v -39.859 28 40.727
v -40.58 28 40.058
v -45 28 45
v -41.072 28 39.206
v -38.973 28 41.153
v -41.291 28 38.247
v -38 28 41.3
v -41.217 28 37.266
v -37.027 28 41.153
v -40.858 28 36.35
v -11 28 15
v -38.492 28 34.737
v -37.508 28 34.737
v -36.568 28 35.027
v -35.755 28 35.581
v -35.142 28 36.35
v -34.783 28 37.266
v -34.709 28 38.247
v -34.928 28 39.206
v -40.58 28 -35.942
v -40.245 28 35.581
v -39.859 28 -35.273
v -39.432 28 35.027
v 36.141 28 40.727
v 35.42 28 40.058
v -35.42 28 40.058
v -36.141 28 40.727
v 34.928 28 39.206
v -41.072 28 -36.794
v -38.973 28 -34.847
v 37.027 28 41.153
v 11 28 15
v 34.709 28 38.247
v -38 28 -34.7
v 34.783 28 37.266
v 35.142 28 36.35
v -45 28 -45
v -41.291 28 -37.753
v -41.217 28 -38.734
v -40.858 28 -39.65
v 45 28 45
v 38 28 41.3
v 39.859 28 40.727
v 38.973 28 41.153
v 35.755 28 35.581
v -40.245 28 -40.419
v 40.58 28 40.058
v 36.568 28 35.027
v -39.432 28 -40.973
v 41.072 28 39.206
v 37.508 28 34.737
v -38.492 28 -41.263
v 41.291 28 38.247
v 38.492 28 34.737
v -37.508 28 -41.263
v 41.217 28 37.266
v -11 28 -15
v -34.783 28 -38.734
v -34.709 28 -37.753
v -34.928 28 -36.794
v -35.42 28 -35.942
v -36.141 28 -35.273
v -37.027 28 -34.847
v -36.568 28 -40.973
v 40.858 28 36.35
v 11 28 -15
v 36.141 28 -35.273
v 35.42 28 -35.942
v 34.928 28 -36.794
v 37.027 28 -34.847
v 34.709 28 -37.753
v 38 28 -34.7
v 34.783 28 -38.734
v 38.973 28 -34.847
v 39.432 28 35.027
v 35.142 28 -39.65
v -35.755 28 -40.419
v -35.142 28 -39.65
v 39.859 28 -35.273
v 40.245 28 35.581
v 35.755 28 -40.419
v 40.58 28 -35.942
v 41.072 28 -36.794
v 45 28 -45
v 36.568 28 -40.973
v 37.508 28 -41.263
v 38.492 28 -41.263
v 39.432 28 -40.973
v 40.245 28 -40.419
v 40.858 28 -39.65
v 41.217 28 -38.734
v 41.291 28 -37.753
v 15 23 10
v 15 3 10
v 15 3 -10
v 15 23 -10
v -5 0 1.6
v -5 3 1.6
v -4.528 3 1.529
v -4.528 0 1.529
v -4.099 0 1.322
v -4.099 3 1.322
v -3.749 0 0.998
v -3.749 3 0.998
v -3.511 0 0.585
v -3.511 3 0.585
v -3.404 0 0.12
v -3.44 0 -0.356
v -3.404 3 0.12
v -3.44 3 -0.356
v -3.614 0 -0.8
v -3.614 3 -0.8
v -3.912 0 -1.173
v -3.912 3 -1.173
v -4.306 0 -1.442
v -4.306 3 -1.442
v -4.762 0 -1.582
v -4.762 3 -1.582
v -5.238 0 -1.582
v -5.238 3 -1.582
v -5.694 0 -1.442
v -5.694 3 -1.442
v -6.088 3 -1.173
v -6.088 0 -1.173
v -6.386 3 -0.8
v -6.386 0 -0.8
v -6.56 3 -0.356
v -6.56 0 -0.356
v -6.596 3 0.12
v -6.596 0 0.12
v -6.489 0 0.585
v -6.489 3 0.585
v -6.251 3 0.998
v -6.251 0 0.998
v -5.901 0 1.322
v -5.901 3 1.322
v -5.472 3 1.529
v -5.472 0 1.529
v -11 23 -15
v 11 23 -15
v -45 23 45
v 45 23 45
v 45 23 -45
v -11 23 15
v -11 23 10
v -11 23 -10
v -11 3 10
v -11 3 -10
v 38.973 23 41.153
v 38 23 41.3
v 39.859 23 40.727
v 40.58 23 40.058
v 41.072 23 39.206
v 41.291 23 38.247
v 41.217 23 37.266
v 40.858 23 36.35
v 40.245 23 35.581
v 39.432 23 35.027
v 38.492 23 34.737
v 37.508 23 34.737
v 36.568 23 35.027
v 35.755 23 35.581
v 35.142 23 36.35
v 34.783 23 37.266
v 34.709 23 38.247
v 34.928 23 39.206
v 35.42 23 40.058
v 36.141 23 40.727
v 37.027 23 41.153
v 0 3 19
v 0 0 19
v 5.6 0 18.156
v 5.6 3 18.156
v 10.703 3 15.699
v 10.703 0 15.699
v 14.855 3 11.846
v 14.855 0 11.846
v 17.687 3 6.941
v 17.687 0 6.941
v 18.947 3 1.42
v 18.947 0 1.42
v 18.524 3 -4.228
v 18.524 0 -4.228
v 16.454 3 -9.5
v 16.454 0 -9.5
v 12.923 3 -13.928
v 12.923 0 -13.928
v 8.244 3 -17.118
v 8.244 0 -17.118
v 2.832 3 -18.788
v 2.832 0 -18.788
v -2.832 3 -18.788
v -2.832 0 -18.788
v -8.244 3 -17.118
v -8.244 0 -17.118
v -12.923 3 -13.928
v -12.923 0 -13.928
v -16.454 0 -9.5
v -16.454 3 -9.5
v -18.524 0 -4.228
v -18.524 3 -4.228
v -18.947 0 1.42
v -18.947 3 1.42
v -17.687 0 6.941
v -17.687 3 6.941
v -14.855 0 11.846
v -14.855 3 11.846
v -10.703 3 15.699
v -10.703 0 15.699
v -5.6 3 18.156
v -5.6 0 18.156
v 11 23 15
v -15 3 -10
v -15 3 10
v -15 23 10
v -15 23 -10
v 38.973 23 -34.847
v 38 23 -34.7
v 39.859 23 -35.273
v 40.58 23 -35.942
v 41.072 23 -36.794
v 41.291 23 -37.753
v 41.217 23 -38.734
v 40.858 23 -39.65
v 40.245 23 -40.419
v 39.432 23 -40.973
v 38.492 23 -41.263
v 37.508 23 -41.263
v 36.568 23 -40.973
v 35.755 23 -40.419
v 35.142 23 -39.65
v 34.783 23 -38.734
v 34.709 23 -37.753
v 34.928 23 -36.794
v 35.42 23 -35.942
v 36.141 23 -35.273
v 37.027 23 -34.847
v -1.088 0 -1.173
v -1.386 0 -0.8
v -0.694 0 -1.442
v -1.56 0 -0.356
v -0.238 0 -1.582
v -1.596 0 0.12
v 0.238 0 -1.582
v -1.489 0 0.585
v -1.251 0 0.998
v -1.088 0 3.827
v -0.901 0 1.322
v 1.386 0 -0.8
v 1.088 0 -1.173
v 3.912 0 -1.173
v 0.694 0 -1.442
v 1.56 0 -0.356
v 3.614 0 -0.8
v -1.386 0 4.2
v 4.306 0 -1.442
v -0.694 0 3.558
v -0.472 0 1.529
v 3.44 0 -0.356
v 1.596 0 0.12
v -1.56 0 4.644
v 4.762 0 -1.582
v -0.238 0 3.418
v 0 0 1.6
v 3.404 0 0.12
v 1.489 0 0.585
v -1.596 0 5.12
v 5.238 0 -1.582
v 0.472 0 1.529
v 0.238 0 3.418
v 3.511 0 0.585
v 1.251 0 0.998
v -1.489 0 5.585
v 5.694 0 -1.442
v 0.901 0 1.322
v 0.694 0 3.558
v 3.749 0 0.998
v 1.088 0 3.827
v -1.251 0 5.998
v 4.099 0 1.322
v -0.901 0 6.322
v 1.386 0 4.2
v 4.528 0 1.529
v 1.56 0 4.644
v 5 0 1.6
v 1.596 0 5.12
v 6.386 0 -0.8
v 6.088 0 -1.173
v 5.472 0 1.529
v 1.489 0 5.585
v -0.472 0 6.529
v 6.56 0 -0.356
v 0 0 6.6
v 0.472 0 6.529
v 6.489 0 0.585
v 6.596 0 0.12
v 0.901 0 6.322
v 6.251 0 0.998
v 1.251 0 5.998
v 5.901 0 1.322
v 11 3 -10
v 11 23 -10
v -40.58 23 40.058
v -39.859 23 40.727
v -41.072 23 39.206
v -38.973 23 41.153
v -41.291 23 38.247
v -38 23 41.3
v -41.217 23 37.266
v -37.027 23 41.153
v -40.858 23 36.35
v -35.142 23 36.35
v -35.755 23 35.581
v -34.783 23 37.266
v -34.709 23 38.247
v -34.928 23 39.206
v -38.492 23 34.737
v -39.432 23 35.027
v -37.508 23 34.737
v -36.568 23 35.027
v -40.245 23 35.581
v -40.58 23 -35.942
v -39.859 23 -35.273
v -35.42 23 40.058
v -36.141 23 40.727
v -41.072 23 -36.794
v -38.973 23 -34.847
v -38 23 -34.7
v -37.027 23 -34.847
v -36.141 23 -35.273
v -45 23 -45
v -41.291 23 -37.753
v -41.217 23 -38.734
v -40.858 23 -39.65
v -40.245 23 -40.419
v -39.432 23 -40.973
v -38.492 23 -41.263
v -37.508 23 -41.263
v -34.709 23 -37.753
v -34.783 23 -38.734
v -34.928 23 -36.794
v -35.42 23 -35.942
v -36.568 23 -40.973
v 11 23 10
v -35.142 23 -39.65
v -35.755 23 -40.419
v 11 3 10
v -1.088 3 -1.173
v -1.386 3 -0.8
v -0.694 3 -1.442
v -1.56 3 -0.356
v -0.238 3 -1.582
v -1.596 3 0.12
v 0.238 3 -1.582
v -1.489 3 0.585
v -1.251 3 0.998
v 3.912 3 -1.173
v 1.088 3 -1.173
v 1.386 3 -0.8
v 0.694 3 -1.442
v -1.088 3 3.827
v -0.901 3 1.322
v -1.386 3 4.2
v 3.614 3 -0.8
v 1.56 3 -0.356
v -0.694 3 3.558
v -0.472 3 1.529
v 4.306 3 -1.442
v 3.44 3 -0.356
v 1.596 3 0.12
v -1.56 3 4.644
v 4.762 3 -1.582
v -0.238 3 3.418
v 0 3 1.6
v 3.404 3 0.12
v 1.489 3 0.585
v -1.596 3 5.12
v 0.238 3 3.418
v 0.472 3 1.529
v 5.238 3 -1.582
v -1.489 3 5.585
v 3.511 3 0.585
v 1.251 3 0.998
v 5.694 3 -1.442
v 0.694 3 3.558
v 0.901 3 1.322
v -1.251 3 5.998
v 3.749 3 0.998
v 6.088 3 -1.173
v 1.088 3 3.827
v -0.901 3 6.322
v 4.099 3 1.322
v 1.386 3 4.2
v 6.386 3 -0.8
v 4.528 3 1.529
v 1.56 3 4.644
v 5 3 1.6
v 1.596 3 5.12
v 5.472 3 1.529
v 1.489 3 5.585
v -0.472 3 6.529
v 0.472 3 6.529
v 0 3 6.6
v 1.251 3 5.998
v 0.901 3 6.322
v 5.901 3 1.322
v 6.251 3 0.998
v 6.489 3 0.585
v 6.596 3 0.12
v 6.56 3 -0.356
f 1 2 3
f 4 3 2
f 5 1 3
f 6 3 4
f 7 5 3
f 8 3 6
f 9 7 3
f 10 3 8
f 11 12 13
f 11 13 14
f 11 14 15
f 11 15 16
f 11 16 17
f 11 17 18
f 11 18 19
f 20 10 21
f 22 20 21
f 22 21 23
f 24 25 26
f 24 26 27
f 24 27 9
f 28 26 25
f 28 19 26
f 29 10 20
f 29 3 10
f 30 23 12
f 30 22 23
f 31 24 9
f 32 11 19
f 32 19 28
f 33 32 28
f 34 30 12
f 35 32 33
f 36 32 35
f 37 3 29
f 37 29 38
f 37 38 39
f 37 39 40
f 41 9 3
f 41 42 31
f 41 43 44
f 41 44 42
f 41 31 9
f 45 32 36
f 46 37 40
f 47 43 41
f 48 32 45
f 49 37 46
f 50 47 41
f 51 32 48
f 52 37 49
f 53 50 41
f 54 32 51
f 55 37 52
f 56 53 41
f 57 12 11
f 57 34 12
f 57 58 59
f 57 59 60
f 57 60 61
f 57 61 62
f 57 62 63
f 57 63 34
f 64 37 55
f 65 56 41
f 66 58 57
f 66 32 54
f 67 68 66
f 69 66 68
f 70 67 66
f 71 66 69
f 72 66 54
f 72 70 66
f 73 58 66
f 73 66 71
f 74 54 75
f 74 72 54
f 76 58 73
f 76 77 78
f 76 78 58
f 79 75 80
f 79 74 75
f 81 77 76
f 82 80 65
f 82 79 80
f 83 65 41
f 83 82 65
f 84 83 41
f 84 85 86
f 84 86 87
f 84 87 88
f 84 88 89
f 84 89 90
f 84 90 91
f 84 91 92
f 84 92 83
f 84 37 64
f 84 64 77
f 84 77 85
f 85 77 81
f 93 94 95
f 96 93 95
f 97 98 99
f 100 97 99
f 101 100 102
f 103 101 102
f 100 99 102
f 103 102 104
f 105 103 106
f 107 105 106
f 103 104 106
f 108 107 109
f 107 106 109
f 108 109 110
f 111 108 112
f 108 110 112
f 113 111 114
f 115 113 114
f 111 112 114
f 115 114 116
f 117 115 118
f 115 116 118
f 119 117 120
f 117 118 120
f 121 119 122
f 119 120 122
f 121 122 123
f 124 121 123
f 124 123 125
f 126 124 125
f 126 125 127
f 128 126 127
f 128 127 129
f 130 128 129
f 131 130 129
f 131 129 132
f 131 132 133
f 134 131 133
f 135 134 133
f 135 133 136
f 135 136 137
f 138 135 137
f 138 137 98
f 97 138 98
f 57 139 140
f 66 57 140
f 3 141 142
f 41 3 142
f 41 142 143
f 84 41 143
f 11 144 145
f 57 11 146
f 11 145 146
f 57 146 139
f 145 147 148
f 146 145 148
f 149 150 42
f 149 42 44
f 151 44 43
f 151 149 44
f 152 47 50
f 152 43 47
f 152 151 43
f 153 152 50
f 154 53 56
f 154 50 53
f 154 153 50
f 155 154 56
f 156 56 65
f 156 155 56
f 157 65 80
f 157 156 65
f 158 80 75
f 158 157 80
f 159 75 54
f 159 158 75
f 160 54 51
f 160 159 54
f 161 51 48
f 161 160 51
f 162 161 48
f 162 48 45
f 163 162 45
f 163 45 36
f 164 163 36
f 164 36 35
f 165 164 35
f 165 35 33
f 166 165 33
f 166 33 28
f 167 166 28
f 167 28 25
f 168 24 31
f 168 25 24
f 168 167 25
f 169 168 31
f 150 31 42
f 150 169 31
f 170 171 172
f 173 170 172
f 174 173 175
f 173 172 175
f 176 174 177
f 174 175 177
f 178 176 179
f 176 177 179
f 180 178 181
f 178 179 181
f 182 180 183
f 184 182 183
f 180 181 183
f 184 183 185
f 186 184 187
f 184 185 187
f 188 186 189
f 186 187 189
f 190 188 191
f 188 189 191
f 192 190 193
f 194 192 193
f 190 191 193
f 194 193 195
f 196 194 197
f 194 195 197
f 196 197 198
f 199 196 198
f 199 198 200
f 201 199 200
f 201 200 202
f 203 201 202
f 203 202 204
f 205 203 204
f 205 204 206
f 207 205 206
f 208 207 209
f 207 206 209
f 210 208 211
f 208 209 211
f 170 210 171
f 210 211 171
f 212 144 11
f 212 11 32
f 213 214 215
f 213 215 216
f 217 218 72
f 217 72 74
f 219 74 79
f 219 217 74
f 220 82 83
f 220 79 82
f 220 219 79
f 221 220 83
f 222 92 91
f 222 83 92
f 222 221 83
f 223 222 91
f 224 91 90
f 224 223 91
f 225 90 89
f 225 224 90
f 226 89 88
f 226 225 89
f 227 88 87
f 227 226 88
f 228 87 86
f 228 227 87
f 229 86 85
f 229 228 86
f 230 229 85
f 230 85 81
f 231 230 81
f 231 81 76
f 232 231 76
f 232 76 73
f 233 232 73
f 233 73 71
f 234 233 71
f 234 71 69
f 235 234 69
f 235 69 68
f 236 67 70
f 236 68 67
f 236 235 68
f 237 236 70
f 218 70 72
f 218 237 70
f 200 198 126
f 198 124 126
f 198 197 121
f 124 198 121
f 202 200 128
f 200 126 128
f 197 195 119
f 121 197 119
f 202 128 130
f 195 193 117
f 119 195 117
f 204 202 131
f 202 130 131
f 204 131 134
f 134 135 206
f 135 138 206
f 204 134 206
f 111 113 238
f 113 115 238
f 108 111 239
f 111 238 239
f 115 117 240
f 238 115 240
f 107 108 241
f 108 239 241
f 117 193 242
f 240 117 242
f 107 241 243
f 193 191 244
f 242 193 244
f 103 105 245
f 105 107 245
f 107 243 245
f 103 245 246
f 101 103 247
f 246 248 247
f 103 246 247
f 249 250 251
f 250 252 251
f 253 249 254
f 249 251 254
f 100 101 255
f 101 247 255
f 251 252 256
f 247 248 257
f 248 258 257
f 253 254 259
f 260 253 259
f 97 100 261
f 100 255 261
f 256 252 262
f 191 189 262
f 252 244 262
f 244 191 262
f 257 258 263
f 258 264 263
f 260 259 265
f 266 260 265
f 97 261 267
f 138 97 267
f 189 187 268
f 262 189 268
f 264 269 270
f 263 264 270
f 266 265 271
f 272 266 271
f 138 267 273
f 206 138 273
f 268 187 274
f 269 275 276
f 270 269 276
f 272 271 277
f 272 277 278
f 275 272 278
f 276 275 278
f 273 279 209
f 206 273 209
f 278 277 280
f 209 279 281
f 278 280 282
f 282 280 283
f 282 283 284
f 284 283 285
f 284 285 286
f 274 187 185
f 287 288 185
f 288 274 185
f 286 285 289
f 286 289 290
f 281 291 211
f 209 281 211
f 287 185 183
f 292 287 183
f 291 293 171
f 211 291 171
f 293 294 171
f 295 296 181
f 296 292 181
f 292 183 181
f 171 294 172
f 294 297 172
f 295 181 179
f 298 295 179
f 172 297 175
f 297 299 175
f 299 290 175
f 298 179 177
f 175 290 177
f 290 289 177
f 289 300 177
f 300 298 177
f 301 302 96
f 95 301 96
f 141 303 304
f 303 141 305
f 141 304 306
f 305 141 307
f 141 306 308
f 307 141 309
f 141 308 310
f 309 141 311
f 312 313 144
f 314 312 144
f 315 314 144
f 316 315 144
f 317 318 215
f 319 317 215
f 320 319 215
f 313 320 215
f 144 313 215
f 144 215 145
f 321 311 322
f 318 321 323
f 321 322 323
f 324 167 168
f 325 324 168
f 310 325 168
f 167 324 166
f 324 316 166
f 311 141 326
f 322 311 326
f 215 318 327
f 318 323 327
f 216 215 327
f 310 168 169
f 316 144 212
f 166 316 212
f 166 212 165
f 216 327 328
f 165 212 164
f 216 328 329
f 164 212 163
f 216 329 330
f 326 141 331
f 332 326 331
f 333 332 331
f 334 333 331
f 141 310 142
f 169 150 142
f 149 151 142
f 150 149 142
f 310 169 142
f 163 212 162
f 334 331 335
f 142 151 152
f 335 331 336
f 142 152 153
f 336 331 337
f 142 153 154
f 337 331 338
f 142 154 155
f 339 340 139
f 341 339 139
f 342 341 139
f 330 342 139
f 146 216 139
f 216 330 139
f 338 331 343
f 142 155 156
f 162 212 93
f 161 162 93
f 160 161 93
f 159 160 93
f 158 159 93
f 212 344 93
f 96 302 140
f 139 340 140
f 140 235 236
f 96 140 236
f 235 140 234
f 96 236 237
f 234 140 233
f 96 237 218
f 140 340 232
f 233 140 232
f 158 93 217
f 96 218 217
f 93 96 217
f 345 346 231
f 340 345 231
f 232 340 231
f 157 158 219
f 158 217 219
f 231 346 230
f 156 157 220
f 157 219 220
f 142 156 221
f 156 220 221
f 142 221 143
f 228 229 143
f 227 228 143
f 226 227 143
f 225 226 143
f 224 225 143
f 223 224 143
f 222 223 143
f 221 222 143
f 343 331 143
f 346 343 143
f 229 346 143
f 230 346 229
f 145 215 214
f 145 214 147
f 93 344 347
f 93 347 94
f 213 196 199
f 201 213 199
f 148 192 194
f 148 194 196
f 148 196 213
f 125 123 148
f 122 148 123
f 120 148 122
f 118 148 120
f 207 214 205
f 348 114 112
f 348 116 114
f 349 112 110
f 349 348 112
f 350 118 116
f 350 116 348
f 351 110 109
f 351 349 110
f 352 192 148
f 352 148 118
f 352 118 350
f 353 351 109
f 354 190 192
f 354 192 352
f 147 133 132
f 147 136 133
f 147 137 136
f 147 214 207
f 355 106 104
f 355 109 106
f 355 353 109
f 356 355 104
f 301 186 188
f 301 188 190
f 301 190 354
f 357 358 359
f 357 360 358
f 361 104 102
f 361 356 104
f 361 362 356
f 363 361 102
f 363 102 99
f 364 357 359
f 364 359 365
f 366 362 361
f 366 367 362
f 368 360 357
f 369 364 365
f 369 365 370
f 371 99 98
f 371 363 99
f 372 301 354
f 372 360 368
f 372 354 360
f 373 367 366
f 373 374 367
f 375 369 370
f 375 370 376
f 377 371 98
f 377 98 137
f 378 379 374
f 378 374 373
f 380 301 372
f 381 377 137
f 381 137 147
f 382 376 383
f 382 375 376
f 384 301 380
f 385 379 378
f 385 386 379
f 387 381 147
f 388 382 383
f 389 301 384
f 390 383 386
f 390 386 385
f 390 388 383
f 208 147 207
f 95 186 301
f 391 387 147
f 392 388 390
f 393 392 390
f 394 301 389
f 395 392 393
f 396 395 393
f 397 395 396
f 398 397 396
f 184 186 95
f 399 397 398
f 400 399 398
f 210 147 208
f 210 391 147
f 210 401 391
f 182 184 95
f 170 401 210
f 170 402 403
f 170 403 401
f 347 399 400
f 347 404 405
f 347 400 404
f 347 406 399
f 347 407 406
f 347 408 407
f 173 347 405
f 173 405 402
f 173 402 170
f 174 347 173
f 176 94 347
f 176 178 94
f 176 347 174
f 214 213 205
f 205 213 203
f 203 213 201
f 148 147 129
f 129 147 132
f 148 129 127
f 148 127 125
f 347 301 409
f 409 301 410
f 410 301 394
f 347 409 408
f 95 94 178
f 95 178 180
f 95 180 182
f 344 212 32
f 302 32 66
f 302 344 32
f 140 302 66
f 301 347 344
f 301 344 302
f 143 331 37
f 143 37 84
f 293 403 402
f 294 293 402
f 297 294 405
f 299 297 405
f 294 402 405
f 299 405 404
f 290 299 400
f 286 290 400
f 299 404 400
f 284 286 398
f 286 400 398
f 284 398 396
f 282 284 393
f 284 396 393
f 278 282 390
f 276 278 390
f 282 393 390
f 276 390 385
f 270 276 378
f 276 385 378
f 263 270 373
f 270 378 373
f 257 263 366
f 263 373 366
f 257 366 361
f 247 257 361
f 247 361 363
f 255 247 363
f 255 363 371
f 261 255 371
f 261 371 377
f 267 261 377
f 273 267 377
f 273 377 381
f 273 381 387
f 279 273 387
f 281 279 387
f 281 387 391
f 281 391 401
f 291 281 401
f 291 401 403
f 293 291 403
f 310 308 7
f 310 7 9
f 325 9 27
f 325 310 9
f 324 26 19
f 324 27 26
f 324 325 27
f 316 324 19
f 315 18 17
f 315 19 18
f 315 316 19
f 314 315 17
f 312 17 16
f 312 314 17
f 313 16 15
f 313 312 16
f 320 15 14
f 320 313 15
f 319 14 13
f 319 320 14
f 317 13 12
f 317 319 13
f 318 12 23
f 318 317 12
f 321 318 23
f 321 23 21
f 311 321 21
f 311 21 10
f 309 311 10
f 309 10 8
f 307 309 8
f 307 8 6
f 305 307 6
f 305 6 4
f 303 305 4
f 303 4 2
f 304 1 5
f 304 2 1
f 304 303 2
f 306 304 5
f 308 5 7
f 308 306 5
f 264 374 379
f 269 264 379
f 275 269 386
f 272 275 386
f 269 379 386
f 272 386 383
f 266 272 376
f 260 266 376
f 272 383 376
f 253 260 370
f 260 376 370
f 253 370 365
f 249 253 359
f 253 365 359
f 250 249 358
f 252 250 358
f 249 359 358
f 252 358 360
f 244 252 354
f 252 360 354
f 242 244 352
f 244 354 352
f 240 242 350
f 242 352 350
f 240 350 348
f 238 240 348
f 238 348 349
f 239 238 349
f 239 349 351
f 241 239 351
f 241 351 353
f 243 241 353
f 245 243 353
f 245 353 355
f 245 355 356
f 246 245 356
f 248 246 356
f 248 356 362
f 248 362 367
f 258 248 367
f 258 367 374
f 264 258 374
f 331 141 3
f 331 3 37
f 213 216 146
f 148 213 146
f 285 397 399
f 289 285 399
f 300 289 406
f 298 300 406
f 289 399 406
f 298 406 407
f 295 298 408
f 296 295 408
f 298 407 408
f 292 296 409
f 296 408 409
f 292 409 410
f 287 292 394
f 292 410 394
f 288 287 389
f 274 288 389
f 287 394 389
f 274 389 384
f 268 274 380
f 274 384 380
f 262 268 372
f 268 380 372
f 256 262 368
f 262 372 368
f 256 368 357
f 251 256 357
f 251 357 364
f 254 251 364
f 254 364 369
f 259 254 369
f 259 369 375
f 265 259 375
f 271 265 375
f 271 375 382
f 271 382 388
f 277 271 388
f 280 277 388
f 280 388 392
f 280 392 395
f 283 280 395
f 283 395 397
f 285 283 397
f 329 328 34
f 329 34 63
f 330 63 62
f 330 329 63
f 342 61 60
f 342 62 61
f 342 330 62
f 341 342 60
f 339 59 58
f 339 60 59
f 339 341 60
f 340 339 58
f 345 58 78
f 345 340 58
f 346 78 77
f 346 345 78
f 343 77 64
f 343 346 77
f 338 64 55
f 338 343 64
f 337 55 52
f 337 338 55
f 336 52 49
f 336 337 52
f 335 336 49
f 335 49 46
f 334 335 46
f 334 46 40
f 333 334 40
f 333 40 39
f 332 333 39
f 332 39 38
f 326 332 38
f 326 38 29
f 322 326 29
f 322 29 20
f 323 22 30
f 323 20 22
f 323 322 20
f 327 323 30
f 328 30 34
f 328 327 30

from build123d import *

# Parameters (mm, degrees)
SKETCH_1_R               = 19
EXTRUDE_1_DEPTH          = 3
CUT_EXTRUDE_1_REACH      = 29.037
SKETCH_2_R               = 1.6
SKETCH_3_W               = 4
SKETCH_3_H               = 20
EXTRUDE_2_DEPTH          = 20
SKETCH_4_W               = 90
SKETCH_4_H               = 90
EXTRUDE_3_DEPTH          = 5
CUT_EXTRUDE_2_DEPTH      = 70.526973183
CUT_EXTRUDE_2_DEPTH_BACK = 70.526973183
SKETCH_5_R               = 3.3
CUT_EXTRUDE_3_DEPTH      = 70.526973183
CUT_EXTRUDE_3_DEPTH_BACK = 5
SKETCH_6_W               = 22
SKETCH_6_H               = 30


with BuildPart() as part:
    # 草图1 → 凸台-拉伸1 (new body)
    with BuildSketch(Plane(origin=(0, 0, 0), x_dir=(1, 0, 0), z_dir=(0, 1, 0))):
        with Locations(Location((0, 0, 0), (0, 0, 270))):
            Circle(SKETCH_1_R)
    extrude(amount=EXTRUDE_1_DEPTH)

    # 草图2 → 切除-拉伸1 (cut, up to next)
    with BuildSketch(Plane(origin=(0, 3, 0), x_dir=(1, 0, 0), z_dir=(0, 1, 0)), mode=Mode.PRIVATE) as cut_extrude_1_sk1:
        with Locations(Location((-5, 0, 0), (0, 0, 270))):
            Circle(SKETCH_2_R)
    cut_extrude_1_tool1 = extrude(cut_extrude_1_sk1.sketch, amount=-CUT_EXTRUDE_1_REACH, mode=Mode.PRIVATE) & part.part
    # 草图2 → 切除-拉伸1 (cut, up to next)
    with BuildSketch(Plane(origin=(0, 3, 0), x_dir=(1, 0, 0), z_dir=(0, 1, 0)), mode=Mode.PRIVATE) as cut_extrude_1_sk2:
        with Locations(Location((0, 0, 0), (0, 0, 270))):
            Circle(SKETCH_2_R)
    cut_extrude_1_tool2 = extrude(cut_extrude_1_sk2.sketch, amount=-CUT_EXTRUDE_1_REACH, mode=Mode.PRIVATE) & part.part
    # 草图2 → 切除-拉伸1 (cut, up to next)
    with BuildSketch(Plane(origin=(0, 3, 0), x_dir=(1, 0, 0), z_dir=(0, 1, 0)), mode=Mode.PRIVATE) as cut_extrude_1_sk3:
        with Locations(Location((5, 0, 0), (0, 0, 270))):
            Circle(SKETCH_2_R)
    cut_extrude_1_tool3 = extrude(cut_extrude_1_sk3.sketch, amount=-CUT_EXTRUDE_1_REACH, mode=Mode.PRIVATE) & part.part
    # 草图2 → 切除-拉伸1 (cut, up to next)
    with BuildSketch(Plane(origin=(0, 3, 0), x_dir=(1, 0, 0), z_dir=(0, 1, 0)), mode=Mode.PRIVATE) as cut_extrude_1_sk4:
        with Locations(Location((0, -5, 0), (0, 0, 270))):
            Circle(SKETCH_2_R)
    cut_extrude_1_tool4 = extrude(cut_extrude_1_sk4.sketch, amount=-CUT_EXTRUDE_1_REACH, mode=Mode.PRIVATE) & part.part
    add(cut_extrude_1_tool1.solids().sort_by_distance((-5, 3, 0))[0], mode=Mode.SUBTRACT)
    add(cut_extrude_1_tool2.solids().sort_by_distance((0, 3, 0))[0], mode=Mode.SUBTRACT)
    add(cut_extrude_1_tool3.solids().sort_by_distance((5, 3, 0))[0], mode=Mode.SUBTRACT)
    add(cut_extrude_1_tool4.solids().sort_by_distance((0, 3, 5))[0], mode=Mode.SUBTRACT)

    # 草图3 → 凸台-拉伸2 (add)
    with BuildSketch(Plane(origin=(0, 3, 0), x_dir=(1, 0, 0), z_dir=(0, 1, 0))):
        with Locations((-13, 0)):
            Rectangle(SKETCH_3_W, SKETCH_3_H)
        with Locations((13, 0)):
            Rectangle(SKETCH_3_W, SKETCH_3_H)
    extrude(amount=EXTRUDE_2_DEPTH)

    # 草图4 → 凸台-拉伸3 (add)
    with BuildSketch(Plane(origin=(0, 23, 0), x_dir=(1, 0, 0), z_dir=(0, 1, 0))):
        Rectangle(SKETCH_4_W, SKETCH_4_H)
    extrude(amount=EXTRUDE_3_DEPTH)

    # 草图5 → 切除-拉伸2 (cut, two sides: drawn at the far end of the back side and taken through both)
    with BuildSketch(Plane(origin=(0, 28, 0), x_dir=(1, 0, 0), z_dir=(0, 1, 0)).offset(-CUT_EXTRUDE_2_DEPTH_BACK)):
        with Locations(Location((-38, 38, 0), (0, 0, 270))):
            Circle(SKETCH_5_R)
        with Locations(Location((38, 38, 0), (0, 0, 270))):
            Circle(SKETCH_5_R)
        with Locations(Location((-38, -38, 0), (0, 0, 270))):
            Circle(SKETCH_5_R)
        with Locations(Location((38, -38, 0), (0, 0, 270))):
            Circle(SKETCH_5_R)
    extrude(amount=CUT_EXTRUDE_2_DEPTH + CUT_EXTRUDE_2_DEPTH_BACK, mode=Mode.SUBTRACT)

    # 草图6 → 切除-拉伸3 (cut, two sides: drawn at the far end of the back side and taken through both)
    with BuildSketch(Plane(origin=(0, 28, 0), x_dir=(1, 0, 0), z_dir=(0, 1, 0)).offset(-CUT_EXTRUDE_3_DEPTH_BACK)):
        Rectangle(SKETCH_6_W, SKETCH_6_H)
    extrude(amount=CUT_EXTRUDE_3_DEPTH + CUT_EXTRUDE_3_DEPTH_BACK, mode=Mode.SUBTRACT)


solid = part.part
